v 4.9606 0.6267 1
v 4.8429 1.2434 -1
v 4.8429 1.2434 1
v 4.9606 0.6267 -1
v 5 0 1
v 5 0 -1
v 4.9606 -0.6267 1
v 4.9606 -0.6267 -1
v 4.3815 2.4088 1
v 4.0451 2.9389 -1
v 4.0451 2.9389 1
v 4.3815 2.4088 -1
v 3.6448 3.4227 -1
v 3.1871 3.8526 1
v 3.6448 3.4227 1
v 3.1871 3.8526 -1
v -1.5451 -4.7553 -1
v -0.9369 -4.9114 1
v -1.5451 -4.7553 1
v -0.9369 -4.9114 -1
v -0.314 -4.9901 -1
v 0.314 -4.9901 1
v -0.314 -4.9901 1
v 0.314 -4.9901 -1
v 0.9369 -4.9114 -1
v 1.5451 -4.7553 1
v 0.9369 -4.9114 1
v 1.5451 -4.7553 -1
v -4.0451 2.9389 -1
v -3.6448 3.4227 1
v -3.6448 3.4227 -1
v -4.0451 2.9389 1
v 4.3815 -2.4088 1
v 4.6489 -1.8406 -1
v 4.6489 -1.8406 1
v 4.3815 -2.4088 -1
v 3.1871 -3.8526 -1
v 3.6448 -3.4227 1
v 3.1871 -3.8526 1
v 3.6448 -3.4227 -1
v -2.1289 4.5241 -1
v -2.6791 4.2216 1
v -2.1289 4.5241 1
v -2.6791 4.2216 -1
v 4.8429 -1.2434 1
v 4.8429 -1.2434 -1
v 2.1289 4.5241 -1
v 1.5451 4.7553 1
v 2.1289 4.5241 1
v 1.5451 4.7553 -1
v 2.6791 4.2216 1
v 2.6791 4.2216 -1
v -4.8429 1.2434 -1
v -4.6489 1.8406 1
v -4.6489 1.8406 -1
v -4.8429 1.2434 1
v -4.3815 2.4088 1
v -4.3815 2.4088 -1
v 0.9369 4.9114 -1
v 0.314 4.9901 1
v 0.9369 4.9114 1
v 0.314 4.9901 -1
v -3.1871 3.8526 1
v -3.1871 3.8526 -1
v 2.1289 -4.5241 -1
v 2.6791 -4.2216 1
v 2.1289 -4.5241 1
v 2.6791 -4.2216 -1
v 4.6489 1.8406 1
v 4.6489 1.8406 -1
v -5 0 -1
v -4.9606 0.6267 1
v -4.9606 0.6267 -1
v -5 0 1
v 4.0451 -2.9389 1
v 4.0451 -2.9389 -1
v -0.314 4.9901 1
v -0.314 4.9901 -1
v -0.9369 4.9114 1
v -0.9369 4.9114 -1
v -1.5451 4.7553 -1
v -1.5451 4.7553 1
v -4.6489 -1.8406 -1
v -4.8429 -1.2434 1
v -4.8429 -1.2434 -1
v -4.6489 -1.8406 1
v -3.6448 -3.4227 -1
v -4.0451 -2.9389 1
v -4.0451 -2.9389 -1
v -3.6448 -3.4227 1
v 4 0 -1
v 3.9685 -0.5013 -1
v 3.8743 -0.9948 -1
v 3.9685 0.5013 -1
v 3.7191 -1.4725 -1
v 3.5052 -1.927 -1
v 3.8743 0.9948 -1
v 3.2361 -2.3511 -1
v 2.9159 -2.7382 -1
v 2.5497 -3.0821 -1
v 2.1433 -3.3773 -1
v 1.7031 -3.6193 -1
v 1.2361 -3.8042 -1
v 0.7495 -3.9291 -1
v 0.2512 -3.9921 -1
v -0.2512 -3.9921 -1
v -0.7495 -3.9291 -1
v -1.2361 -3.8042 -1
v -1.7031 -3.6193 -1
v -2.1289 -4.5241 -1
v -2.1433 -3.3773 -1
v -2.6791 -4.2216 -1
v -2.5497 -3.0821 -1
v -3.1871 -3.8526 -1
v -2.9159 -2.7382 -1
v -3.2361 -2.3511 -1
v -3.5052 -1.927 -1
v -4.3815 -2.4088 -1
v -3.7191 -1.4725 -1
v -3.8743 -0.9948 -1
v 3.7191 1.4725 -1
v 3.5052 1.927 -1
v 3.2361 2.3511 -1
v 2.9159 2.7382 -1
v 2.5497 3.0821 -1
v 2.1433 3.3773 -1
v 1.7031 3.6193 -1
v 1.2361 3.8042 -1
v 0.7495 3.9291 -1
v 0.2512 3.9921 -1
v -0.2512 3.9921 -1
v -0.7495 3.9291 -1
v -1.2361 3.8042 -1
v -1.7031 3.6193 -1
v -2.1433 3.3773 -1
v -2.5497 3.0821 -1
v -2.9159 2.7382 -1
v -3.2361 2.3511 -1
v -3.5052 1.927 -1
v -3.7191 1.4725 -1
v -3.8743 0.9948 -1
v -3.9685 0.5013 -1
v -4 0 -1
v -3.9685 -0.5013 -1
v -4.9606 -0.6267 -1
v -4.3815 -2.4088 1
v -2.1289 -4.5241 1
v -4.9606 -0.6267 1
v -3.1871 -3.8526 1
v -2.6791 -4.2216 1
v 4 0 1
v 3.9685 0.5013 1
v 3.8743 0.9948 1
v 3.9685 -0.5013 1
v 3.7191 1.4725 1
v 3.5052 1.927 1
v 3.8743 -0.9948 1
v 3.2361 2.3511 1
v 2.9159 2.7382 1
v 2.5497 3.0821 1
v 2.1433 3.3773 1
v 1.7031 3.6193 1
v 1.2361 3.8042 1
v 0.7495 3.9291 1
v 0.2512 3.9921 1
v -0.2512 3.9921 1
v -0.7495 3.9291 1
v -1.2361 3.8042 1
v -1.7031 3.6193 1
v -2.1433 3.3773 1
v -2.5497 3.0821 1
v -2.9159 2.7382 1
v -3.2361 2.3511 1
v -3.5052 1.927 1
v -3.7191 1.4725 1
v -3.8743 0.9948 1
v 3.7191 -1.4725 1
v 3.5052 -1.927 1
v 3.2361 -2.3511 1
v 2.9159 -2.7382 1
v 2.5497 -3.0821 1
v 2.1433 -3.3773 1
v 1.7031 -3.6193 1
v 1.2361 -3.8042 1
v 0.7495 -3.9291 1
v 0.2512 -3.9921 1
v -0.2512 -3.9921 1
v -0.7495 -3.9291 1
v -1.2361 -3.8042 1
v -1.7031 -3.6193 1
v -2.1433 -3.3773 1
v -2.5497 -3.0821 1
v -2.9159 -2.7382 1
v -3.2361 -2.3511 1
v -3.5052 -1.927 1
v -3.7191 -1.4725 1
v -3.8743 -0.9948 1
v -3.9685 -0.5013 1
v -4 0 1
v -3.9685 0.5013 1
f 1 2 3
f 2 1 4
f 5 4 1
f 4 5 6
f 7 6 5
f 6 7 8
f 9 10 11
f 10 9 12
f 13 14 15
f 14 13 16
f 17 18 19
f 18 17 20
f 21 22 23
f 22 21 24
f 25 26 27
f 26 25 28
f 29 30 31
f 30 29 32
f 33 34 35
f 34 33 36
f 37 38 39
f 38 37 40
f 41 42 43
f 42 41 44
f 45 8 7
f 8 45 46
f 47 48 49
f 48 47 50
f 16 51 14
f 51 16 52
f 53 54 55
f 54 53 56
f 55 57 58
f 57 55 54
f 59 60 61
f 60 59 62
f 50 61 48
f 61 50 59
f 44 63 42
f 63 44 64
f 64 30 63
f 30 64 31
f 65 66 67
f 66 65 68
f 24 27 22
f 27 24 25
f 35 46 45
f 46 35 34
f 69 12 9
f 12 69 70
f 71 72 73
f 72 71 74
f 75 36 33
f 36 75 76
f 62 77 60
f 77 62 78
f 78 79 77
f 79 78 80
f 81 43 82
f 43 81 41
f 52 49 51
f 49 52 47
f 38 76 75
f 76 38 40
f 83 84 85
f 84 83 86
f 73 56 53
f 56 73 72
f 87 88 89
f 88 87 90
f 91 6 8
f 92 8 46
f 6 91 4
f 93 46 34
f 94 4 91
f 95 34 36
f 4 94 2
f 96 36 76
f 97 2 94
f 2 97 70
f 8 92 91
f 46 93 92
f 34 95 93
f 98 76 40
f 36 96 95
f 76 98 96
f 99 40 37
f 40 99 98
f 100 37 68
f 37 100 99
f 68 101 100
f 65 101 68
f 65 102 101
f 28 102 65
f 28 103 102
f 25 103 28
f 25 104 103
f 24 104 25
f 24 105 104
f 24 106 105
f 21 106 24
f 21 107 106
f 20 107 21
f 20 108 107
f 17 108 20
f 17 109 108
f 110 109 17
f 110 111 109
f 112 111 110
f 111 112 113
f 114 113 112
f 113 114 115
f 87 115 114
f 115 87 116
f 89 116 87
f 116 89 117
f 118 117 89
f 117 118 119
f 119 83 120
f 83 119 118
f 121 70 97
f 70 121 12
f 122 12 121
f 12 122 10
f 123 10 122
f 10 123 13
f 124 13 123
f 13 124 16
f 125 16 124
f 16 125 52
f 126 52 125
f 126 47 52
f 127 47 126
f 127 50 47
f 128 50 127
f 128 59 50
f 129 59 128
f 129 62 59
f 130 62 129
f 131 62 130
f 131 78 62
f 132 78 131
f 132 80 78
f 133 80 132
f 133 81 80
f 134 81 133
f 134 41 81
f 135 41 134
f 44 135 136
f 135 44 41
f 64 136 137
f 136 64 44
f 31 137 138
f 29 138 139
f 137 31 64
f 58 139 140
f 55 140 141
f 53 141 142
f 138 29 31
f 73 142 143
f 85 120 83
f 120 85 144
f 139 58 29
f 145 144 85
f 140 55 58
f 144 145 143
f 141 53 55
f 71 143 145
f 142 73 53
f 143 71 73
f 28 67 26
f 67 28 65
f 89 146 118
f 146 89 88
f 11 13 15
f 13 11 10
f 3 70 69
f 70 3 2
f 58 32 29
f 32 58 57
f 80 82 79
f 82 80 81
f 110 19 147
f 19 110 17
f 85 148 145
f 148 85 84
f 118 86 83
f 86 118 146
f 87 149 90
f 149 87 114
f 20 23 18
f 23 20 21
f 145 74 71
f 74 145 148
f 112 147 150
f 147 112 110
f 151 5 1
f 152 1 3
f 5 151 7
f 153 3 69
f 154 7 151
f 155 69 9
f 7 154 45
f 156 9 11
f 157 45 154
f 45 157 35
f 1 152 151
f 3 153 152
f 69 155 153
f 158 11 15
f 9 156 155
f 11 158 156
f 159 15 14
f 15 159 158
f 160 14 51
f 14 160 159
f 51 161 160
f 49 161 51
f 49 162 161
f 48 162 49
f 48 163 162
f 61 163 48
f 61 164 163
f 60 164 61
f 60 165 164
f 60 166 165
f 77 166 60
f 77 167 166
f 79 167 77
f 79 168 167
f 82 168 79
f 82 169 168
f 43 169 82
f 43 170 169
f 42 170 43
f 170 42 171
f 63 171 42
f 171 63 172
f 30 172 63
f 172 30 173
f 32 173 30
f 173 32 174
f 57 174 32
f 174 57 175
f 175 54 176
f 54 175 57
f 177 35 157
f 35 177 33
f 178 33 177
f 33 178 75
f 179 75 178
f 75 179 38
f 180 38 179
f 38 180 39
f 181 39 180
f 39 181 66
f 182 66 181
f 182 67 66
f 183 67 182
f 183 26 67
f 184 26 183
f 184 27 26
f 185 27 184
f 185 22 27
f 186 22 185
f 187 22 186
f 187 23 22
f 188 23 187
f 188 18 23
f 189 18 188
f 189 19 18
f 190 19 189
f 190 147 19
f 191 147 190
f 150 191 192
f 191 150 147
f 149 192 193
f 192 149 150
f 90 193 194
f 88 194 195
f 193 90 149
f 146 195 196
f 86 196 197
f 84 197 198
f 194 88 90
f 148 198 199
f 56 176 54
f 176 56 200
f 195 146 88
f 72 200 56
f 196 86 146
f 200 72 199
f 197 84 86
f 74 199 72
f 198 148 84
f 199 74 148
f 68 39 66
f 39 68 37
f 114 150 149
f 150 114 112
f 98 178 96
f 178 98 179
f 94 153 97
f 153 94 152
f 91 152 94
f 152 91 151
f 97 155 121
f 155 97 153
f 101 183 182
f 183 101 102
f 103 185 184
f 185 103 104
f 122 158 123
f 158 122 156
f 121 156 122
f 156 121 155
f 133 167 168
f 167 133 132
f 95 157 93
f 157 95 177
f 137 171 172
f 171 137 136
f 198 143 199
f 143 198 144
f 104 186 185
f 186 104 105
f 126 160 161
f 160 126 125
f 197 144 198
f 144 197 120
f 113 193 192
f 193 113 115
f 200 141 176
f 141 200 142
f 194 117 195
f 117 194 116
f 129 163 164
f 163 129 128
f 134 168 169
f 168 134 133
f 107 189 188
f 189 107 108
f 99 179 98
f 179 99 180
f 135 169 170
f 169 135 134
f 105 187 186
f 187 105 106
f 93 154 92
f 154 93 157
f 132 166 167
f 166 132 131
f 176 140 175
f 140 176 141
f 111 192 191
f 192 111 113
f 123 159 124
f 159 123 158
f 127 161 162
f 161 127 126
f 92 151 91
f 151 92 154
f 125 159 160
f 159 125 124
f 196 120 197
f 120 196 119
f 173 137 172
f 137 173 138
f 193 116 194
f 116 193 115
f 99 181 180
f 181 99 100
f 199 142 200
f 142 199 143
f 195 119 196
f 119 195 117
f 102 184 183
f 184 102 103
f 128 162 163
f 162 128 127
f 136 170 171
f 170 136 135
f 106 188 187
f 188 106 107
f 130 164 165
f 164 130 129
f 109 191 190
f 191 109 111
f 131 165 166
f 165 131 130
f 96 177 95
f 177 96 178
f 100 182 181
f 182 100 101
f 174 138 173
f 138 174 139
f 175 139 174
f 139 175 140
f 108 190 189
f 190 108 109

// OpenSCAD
$fn = 50;


difference() {
	union() {
		translate(v = [0, 0, -1.0000000000]) {
			cylinder(h = 2, r = 5.0000000000);
		}
	}
	union() {
		translate(v = [0, 0, -100.0000000000]) {
			cylinder(h = 200, r = 4.0000000000);
		}
	}
}
